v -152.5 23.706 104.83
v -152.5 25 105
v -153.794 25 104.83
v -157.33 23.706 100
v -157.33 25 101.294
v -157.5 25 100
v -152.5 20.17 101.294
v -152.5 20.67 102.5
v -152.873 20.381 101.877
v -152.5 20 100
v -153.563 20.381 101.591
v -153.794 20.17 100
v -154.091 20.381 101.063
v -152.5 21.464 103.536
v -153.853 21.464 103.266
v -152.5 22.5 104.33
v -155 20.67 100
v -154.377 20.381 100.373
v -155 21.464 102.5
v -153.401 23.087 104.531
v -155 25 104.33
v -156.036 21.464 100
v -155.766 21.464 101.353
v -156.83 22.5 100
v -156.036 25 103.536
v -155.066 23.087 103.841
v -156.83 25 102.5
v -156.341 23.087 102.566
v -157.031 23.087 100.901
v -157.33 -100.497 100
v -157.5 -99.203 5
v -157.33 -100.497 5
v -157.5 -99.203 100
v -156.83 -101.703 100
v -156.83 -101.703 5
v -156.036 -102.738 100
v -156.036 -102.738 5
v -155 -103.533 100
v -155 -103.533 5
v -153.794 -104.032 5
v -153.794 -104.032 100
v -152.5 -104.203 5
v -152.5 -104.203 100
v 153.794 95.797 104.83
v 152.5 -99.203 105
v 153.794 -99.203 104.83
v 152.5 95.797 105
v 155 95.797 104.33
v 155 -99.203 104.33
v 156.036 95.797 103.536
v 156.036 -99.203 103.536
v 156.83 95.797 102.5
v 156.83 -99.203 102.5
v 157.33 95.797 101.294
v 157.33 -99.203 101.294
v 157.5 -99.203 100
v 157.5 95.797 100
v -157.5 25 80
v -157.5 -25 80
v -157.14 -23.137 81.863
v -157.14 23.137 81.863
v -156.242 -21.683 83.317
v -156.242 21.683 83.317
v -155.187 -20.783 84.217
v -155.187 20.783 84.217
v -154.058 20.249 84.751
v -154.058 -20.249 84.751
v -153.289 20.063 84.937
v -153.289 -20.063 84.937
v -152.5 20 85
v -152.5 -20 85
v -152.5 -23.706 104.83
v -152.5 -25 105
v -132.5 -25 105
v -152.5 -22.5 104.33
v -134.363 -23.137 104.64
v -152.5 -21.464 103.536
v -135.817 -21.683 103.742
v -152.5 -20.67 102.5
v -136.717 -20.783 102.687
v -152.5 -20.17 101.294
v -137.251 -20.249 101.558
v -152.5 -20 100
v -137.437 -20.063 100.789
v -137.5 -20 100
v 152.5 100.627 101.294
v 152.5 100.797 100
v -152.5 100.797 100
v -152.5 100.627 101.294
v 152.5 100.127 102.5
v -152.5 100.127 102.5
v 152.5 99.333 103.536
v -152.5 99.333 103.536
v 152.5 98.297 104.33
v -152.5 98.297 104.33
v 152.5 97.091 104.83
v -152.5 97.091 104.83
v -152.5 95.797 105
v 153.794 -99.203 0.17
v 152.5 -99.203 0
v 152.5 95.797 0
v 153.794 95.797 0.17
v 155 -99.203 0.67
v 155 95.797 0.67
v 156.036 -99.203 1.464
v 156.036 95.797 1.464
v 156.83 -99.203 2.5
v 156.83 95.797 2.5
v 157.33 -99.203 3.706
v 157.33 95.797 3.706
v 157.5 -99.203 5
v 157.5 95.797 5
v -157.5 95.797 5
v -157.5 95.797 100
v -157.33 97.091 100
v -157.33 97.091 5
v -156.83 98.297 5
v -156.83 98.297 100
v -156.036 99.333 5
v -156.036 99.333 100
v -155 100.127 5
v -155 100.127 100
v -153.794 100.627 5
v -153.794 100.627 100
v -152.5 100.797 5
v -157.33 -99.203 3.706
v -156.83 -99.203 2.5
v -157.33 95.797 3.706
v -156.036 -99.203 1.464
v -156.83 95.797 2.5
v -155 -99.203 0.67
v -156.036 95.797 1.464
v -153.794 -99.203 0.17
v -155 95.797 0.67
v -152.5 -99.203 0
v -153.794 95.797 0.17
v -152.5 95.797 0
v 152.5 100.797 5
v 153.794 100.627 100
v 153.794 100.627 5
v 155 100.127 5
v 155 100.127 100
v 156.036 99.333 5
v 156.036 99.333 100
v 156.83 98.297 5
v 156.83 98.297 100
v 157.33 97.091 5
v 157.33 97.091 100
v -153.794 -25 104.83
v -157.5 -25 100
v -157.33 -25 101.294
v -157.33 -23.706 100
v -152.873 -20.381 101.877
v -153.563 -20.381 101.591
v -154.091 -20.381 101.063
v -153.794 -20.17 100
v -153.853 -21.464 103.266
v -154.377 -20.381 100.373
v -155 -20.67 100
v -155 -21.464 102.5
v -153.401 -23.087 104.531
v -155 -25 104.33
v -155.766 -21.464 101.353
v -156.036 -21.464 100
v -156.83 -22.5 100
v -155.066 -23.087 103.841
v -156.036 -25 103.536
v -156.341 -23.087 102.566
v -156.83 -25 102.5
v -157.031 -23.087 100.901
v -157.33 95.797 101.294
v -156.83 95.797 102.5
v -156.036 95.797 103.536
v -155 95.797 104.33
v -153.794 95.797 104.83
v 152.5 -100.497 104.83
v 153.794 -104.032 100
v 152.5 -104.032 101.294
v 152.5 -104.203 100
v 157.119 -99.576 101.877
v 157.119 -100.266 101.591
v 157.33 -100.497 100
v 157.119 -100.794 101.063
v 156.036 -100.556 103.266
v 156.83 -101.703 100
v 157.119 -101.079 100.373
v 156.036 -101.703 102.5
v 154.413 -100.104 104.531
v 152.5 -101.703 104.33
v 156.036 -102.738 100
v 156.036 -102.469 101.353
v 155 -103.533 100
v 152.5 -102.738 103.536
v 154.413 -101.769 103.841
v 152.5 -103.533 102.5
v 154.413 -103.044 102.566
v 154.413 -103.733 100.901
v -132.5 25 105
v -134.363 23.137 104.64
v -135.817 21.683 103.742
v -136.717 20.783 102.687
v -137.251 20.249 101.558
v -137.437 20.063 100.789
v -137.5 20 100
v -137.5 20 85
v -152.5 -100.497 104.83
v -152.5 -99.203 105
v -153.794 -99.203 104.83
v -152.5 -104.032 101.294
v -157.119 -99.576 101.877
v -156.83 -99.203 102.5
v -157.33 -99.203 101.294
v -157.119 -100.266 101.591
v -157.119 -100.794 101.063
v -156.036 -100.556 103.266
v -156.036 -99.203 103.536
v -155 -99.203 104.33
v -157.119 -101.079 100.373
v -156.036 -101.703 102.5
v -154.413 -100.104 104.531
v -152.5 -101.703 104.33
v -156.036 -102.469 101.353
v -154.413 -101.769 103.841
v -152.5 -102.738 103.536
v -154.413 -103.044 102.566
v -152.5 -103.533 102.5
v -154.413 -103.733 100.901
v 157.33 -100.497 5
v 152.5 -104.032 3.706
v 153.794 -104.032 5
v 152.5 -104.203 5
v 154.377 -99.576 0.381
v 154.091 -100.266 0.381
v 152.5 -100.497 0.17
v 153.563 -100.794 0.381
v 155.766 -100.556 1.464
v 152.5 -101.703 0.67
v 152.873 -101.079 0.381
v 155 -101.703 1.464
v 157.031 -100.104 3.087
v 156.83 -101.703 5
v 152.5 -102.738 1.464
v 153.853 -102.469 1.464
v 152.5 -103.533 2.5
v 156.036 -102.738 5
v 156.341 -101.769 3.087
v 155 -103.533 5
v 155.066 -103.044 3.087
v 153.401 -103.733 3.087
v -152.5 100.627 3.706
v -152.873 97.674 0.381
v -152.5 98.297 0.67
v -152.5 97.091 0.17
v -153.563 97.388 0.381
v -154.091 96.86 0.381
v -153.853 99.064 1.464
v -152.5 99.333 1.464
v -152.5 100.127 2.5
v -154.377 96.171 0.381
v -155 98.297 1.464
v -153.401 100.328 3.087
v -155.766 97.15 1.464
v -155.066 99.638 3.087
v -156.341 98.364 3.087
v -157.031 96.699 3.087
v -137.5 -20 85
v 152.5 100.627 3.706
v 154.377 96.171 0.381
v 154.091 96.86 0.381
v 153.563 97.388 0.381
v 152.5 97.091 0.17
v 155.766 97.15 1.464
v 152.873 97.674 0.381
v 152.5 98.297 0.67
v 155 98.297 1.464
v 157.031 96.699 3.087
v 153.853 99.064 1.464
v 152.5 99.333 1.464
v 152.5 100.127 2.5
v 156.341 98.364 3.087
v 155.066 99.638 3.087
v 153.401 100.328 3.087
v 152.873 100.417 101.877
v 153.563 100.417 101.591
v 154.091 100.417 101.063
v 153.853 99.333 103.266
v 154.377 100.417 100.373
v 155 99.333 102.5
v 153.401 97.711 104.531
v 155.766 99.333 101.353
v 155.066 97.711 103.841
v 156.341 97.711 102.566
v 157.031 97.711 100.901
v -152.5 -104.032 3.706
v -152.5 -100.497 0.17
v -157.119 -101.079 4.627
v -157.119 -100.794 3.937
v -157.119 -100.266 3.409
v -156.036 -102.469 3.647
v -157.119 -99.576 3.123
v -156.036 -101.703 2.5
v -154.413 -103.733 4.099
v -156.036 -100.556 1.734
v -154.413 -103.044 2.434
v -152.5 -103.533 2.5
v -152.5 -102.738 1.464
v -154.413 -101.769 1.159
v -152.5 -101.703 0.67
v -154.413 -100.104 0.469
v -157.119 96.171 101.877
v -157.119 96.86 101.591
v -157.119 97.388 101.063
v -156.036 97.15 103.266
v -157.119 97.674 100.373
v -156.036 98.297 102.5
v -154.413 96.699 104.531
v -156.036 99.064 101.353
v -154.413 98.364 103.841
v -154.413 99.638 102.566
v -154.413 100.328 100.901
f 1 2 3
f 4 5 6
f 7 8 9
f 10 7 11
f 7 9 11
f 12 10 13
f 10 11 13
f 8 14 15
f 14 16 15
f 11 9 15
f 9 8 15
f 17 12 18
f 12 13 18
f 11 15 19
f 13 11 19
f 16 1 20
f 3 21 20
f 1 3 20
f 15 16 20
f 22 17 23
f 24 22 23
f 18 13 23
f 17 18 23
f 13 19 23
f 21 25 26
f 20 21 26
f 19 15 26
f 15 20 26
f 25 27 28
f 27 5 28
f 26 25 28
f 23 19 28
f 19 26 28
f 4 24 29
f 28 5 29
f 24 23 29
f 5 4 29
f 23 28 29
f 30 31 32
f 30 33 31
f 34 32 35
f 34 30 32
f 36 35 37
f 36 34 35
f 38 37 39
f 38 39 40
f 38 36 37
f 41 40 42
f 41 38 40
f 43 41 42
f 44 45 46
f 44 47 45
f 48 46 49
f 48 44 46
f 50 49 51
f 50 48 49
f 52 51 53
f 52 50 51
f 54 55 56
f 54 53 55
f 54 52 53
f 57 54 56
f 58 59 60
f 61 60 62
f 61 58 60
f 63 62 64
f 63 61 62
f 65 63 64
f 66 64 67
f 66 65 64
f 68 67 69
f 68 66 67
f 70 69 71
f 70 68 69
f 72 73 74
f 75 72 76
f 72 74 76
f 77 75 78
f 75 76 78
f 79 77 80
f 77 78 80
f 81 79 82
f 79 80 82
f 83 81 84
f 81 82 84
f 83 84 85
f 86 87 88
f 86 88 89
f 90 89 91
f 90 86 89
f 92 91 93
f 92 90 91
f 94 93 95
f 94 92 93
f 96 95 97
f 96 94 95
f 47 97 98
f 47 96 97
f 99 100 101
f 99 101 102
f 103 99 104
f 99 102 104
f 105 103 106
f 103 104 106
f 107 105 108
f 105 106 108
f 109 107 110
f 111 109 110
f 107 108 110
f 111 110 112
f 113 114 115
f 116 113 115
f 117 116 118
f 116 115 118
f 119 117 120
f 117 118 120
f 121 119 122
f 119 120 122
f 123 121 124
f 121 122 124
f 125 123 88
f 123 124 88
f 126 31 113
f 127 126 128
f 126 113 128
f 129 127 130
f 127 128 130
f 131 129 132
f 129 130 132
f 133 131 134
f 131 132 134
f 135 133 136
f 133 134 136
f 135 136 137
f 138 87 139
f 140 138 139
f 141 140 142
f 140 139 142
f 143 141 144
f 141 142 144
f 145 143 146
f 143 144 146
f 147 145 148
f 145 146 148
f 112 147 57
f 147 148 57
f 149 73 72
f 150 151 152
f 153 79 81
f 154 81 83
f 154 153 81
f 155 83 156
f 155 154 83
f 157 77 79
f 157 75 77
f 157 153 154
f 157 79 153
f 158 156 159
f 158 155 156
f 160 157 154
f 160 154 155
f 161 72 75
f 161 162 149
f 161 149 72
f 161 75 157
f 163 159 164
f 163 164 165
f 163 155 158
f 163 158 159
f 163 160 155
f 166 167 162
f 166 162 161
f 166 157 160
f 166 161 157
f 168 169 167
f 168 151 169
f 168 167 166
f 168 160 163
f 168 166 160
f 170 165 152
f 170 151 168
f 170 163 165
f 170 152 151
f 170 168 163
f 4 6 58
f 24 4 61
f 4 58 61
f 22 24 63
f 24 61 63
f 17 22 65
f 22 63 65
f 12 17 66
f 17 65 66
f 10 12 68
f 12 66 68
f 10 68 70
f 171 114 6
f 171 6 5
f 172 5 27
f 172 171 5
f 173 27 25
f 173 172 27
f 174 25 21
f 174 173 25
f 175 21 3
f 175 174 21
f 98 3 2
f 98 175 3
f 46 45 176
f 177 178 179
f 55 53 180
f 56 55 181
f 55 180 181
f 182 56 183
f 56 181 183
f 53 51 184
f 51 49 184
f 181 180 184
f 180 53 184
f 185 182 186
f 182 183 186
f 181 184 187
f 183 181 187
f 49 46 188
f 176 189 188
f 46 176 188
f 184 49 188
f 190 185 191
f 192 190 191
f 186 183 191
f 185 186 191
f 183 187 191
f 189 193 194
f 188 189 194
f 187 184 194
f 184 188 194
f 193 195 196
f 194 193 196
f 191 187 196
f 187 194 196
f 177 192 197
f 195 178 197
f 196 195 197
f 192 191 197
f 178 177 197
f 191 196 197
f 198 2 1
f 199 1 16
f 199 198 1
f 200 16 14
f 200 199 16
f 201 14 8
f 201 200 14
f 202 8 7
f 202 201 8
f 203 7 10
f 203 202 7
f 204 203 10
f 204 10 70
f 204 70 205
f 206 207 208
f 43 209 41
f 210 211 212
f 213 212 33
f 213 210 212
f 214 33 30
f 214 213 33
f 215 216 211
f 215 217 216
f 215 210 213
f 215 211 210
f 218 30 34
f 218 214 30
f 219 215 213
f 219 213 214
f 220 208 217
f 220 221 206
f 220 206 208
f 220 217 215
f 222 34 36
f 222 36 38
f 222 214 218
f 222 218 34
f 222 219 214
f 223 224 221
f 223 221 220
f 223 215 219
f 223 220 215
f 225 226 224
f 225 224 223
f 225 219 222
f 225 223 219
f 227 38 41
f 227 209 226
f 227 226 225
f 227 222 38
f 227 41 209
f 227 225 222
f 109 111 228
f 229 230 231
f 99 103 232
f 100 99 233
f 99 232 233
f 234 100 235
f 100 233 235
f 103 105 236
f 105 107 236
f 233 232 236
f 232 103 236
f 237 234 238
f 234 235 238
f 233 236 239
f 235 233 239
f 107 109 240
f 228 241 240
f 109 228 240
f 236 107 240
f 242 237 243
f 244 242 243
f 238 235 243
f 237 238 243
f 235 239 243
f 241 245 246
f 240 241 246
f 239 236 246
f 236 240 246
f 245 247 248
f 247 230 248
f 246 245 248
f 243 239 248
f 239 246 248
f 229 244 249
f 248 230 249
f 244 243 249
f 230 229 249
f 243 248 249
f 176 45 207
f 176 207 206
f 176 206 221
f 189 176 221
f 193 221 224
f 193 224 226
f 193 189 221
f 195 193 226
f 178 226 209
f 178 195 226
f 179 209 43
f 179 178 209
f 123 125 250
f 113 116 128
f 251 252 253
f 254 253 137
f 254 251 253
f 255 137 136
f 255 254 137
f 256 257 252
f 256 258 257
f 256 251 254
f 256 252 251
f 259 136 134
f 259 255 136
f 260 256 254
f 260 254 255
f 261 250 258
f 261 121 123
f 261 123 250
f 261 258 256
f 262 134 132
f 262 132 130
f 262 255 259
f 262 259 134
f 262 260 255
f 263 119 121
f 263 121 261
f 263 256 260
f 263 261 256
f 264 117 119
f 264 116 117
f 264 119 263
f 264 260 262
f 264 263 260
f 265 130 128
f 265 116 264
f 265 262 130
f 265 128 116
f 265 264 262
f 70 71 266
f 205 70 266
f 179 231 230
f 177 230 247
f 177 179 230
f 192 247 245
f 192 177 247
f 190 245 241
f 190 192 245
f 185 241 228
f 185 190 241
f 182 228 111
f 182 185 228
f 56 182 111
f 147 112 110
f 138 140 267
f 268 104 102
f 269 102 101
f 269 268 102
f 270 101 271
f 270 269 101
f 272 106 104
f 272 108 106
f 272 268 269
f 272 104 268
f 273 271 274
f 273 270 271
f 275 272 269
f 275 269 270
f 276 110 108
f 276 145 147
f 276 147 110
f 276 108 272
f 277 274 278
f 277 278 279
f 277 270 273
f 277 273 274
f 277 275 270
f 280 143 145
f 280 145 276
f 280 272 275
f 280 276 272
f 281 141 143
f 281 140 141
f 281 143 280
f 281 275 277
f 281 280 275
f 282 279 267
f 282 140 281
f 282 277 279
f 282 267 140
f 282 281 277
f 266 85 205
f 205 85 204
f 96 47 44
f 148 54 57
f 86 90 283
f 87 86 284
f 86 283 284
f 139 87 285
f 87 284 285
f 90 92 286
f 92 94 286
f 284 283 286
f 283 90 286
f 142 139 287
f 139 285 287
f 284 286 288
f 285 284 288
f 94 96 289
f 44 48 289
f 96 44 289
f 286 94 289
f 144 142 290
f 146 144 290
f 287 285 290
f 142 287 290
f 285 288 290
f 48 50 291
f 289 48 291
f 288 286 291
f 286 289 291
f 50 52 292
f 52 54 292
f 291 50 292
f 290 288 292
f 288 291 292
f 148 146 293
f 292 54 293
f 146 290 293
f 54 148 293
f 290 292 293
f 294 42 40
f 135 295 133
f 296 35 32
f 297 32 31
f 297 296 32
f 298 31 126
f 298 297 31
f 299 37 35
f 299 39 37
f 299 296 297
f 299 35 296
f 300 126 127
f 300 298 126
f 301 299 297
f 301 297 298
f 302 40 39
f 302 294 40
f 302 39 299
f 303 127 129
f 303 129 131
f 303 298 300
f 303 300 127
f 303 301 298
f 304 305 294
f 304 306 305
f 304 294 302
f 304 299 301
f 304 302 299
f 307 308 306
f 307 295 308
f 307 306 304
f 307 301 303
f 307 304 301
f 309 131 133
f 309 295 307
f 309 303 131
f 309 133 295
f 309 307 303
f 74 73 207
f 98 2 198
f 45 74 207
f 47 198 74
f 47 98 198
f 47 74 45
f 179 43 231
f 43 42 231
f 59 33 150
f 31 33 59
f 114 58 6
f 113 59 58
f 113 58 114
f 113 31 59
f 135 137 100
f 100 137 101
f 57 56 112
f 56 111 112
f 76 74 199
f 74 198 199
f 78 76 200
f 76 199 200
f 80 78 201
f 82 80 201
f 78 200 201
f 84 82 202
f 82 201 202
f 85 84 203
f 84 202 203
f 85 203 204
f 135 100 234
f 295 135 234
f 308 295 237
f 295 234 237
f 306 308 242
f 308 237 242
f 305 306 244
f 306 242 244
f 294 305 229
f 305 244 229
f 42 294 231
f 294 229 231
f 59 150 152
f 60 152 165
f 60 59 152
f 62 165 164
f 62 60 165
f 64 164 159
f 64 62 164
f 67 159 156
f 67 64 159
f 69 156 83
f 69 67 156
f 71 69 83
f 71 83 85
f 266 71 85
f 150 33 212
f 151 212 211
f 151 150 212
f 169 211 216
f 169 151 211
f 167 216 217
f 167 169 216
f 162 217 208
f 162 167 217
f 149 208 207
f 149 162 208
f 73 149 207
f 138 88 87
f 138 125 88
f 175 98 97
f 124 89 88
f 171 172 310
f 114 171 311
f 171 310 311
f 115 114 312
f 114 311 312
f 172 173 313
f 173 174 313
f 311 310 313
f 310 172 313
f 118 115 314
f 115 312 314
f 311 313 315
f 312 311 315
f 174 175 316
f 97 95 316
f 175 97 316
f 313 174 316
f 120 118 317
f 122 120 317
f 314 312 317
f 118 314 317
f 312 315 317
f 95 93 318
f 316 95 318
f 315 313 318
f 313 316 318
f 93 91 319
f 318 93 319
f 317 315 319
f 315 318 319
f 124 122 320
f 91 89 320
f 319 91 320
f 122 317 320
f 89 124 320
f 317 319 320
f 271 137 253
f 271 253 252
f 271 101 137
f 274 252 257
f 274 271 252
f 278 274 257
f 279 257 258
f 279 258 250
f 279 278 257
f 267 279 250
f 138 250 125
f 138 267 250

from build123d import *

# Parameters (mm, degrees)
F0_W     = 315
F0_H     = 205
F1_DEPTH = 105
F2_W     = 20
F2_H     = 40
F3_DEPTH = 20
F4_R     = 5


with BuildPart() as f1:
    # F0 (on Top) → F1 (new body)
    with BuildSketch(Plane.XY):
        with Locations((0, -1.702649286)):
            Rectangle(F0_W, F0_H)
    extrude(amount=F1_DEPTH)

    # F2 (on face) → F3 (cut)
    with BuildSketch(Plane.XY.offset(105)):
        with Locations((-147.5, 0)):
            Rectangle(F2_W, F2_H)
    extrude(amount=-F3_DEPTH, mode=Mode.SUBTRACT)

    # F4
    f4_edges = [f1.edges().sort_by_distance(p)[0] for p in [
        (0, -104.202649, 105),
        (157.5, -1.702649, 105),
        (0, 100.797351, 105),
        (-157.5, 60.398675, 105),
        (-157.5, -62.101325, 105),
        (-137.5, 0, 105),
        (-147.5, -20, 105),
        (-147.5, 20, 105),
        (157.5, -104.202649, 52.5),
        (157.5, 100.797351, 52.5),
        (157.5, -1.702649, 0),
        (0, -104.202649, 0),
        (-157.5, -104.202649, 52.5),
        (-157.5, 100.797351, 52.5),
        (0, 100.797351, 0),
        (-157.5, -1.702649, 0),
        (-157.5, 0, 85),
        (-157.5, 20, 95),
        (-157.5, -20, 95),
    ]]
    fillet(f4_edges, radius=F4_R)


solid = f1.part
